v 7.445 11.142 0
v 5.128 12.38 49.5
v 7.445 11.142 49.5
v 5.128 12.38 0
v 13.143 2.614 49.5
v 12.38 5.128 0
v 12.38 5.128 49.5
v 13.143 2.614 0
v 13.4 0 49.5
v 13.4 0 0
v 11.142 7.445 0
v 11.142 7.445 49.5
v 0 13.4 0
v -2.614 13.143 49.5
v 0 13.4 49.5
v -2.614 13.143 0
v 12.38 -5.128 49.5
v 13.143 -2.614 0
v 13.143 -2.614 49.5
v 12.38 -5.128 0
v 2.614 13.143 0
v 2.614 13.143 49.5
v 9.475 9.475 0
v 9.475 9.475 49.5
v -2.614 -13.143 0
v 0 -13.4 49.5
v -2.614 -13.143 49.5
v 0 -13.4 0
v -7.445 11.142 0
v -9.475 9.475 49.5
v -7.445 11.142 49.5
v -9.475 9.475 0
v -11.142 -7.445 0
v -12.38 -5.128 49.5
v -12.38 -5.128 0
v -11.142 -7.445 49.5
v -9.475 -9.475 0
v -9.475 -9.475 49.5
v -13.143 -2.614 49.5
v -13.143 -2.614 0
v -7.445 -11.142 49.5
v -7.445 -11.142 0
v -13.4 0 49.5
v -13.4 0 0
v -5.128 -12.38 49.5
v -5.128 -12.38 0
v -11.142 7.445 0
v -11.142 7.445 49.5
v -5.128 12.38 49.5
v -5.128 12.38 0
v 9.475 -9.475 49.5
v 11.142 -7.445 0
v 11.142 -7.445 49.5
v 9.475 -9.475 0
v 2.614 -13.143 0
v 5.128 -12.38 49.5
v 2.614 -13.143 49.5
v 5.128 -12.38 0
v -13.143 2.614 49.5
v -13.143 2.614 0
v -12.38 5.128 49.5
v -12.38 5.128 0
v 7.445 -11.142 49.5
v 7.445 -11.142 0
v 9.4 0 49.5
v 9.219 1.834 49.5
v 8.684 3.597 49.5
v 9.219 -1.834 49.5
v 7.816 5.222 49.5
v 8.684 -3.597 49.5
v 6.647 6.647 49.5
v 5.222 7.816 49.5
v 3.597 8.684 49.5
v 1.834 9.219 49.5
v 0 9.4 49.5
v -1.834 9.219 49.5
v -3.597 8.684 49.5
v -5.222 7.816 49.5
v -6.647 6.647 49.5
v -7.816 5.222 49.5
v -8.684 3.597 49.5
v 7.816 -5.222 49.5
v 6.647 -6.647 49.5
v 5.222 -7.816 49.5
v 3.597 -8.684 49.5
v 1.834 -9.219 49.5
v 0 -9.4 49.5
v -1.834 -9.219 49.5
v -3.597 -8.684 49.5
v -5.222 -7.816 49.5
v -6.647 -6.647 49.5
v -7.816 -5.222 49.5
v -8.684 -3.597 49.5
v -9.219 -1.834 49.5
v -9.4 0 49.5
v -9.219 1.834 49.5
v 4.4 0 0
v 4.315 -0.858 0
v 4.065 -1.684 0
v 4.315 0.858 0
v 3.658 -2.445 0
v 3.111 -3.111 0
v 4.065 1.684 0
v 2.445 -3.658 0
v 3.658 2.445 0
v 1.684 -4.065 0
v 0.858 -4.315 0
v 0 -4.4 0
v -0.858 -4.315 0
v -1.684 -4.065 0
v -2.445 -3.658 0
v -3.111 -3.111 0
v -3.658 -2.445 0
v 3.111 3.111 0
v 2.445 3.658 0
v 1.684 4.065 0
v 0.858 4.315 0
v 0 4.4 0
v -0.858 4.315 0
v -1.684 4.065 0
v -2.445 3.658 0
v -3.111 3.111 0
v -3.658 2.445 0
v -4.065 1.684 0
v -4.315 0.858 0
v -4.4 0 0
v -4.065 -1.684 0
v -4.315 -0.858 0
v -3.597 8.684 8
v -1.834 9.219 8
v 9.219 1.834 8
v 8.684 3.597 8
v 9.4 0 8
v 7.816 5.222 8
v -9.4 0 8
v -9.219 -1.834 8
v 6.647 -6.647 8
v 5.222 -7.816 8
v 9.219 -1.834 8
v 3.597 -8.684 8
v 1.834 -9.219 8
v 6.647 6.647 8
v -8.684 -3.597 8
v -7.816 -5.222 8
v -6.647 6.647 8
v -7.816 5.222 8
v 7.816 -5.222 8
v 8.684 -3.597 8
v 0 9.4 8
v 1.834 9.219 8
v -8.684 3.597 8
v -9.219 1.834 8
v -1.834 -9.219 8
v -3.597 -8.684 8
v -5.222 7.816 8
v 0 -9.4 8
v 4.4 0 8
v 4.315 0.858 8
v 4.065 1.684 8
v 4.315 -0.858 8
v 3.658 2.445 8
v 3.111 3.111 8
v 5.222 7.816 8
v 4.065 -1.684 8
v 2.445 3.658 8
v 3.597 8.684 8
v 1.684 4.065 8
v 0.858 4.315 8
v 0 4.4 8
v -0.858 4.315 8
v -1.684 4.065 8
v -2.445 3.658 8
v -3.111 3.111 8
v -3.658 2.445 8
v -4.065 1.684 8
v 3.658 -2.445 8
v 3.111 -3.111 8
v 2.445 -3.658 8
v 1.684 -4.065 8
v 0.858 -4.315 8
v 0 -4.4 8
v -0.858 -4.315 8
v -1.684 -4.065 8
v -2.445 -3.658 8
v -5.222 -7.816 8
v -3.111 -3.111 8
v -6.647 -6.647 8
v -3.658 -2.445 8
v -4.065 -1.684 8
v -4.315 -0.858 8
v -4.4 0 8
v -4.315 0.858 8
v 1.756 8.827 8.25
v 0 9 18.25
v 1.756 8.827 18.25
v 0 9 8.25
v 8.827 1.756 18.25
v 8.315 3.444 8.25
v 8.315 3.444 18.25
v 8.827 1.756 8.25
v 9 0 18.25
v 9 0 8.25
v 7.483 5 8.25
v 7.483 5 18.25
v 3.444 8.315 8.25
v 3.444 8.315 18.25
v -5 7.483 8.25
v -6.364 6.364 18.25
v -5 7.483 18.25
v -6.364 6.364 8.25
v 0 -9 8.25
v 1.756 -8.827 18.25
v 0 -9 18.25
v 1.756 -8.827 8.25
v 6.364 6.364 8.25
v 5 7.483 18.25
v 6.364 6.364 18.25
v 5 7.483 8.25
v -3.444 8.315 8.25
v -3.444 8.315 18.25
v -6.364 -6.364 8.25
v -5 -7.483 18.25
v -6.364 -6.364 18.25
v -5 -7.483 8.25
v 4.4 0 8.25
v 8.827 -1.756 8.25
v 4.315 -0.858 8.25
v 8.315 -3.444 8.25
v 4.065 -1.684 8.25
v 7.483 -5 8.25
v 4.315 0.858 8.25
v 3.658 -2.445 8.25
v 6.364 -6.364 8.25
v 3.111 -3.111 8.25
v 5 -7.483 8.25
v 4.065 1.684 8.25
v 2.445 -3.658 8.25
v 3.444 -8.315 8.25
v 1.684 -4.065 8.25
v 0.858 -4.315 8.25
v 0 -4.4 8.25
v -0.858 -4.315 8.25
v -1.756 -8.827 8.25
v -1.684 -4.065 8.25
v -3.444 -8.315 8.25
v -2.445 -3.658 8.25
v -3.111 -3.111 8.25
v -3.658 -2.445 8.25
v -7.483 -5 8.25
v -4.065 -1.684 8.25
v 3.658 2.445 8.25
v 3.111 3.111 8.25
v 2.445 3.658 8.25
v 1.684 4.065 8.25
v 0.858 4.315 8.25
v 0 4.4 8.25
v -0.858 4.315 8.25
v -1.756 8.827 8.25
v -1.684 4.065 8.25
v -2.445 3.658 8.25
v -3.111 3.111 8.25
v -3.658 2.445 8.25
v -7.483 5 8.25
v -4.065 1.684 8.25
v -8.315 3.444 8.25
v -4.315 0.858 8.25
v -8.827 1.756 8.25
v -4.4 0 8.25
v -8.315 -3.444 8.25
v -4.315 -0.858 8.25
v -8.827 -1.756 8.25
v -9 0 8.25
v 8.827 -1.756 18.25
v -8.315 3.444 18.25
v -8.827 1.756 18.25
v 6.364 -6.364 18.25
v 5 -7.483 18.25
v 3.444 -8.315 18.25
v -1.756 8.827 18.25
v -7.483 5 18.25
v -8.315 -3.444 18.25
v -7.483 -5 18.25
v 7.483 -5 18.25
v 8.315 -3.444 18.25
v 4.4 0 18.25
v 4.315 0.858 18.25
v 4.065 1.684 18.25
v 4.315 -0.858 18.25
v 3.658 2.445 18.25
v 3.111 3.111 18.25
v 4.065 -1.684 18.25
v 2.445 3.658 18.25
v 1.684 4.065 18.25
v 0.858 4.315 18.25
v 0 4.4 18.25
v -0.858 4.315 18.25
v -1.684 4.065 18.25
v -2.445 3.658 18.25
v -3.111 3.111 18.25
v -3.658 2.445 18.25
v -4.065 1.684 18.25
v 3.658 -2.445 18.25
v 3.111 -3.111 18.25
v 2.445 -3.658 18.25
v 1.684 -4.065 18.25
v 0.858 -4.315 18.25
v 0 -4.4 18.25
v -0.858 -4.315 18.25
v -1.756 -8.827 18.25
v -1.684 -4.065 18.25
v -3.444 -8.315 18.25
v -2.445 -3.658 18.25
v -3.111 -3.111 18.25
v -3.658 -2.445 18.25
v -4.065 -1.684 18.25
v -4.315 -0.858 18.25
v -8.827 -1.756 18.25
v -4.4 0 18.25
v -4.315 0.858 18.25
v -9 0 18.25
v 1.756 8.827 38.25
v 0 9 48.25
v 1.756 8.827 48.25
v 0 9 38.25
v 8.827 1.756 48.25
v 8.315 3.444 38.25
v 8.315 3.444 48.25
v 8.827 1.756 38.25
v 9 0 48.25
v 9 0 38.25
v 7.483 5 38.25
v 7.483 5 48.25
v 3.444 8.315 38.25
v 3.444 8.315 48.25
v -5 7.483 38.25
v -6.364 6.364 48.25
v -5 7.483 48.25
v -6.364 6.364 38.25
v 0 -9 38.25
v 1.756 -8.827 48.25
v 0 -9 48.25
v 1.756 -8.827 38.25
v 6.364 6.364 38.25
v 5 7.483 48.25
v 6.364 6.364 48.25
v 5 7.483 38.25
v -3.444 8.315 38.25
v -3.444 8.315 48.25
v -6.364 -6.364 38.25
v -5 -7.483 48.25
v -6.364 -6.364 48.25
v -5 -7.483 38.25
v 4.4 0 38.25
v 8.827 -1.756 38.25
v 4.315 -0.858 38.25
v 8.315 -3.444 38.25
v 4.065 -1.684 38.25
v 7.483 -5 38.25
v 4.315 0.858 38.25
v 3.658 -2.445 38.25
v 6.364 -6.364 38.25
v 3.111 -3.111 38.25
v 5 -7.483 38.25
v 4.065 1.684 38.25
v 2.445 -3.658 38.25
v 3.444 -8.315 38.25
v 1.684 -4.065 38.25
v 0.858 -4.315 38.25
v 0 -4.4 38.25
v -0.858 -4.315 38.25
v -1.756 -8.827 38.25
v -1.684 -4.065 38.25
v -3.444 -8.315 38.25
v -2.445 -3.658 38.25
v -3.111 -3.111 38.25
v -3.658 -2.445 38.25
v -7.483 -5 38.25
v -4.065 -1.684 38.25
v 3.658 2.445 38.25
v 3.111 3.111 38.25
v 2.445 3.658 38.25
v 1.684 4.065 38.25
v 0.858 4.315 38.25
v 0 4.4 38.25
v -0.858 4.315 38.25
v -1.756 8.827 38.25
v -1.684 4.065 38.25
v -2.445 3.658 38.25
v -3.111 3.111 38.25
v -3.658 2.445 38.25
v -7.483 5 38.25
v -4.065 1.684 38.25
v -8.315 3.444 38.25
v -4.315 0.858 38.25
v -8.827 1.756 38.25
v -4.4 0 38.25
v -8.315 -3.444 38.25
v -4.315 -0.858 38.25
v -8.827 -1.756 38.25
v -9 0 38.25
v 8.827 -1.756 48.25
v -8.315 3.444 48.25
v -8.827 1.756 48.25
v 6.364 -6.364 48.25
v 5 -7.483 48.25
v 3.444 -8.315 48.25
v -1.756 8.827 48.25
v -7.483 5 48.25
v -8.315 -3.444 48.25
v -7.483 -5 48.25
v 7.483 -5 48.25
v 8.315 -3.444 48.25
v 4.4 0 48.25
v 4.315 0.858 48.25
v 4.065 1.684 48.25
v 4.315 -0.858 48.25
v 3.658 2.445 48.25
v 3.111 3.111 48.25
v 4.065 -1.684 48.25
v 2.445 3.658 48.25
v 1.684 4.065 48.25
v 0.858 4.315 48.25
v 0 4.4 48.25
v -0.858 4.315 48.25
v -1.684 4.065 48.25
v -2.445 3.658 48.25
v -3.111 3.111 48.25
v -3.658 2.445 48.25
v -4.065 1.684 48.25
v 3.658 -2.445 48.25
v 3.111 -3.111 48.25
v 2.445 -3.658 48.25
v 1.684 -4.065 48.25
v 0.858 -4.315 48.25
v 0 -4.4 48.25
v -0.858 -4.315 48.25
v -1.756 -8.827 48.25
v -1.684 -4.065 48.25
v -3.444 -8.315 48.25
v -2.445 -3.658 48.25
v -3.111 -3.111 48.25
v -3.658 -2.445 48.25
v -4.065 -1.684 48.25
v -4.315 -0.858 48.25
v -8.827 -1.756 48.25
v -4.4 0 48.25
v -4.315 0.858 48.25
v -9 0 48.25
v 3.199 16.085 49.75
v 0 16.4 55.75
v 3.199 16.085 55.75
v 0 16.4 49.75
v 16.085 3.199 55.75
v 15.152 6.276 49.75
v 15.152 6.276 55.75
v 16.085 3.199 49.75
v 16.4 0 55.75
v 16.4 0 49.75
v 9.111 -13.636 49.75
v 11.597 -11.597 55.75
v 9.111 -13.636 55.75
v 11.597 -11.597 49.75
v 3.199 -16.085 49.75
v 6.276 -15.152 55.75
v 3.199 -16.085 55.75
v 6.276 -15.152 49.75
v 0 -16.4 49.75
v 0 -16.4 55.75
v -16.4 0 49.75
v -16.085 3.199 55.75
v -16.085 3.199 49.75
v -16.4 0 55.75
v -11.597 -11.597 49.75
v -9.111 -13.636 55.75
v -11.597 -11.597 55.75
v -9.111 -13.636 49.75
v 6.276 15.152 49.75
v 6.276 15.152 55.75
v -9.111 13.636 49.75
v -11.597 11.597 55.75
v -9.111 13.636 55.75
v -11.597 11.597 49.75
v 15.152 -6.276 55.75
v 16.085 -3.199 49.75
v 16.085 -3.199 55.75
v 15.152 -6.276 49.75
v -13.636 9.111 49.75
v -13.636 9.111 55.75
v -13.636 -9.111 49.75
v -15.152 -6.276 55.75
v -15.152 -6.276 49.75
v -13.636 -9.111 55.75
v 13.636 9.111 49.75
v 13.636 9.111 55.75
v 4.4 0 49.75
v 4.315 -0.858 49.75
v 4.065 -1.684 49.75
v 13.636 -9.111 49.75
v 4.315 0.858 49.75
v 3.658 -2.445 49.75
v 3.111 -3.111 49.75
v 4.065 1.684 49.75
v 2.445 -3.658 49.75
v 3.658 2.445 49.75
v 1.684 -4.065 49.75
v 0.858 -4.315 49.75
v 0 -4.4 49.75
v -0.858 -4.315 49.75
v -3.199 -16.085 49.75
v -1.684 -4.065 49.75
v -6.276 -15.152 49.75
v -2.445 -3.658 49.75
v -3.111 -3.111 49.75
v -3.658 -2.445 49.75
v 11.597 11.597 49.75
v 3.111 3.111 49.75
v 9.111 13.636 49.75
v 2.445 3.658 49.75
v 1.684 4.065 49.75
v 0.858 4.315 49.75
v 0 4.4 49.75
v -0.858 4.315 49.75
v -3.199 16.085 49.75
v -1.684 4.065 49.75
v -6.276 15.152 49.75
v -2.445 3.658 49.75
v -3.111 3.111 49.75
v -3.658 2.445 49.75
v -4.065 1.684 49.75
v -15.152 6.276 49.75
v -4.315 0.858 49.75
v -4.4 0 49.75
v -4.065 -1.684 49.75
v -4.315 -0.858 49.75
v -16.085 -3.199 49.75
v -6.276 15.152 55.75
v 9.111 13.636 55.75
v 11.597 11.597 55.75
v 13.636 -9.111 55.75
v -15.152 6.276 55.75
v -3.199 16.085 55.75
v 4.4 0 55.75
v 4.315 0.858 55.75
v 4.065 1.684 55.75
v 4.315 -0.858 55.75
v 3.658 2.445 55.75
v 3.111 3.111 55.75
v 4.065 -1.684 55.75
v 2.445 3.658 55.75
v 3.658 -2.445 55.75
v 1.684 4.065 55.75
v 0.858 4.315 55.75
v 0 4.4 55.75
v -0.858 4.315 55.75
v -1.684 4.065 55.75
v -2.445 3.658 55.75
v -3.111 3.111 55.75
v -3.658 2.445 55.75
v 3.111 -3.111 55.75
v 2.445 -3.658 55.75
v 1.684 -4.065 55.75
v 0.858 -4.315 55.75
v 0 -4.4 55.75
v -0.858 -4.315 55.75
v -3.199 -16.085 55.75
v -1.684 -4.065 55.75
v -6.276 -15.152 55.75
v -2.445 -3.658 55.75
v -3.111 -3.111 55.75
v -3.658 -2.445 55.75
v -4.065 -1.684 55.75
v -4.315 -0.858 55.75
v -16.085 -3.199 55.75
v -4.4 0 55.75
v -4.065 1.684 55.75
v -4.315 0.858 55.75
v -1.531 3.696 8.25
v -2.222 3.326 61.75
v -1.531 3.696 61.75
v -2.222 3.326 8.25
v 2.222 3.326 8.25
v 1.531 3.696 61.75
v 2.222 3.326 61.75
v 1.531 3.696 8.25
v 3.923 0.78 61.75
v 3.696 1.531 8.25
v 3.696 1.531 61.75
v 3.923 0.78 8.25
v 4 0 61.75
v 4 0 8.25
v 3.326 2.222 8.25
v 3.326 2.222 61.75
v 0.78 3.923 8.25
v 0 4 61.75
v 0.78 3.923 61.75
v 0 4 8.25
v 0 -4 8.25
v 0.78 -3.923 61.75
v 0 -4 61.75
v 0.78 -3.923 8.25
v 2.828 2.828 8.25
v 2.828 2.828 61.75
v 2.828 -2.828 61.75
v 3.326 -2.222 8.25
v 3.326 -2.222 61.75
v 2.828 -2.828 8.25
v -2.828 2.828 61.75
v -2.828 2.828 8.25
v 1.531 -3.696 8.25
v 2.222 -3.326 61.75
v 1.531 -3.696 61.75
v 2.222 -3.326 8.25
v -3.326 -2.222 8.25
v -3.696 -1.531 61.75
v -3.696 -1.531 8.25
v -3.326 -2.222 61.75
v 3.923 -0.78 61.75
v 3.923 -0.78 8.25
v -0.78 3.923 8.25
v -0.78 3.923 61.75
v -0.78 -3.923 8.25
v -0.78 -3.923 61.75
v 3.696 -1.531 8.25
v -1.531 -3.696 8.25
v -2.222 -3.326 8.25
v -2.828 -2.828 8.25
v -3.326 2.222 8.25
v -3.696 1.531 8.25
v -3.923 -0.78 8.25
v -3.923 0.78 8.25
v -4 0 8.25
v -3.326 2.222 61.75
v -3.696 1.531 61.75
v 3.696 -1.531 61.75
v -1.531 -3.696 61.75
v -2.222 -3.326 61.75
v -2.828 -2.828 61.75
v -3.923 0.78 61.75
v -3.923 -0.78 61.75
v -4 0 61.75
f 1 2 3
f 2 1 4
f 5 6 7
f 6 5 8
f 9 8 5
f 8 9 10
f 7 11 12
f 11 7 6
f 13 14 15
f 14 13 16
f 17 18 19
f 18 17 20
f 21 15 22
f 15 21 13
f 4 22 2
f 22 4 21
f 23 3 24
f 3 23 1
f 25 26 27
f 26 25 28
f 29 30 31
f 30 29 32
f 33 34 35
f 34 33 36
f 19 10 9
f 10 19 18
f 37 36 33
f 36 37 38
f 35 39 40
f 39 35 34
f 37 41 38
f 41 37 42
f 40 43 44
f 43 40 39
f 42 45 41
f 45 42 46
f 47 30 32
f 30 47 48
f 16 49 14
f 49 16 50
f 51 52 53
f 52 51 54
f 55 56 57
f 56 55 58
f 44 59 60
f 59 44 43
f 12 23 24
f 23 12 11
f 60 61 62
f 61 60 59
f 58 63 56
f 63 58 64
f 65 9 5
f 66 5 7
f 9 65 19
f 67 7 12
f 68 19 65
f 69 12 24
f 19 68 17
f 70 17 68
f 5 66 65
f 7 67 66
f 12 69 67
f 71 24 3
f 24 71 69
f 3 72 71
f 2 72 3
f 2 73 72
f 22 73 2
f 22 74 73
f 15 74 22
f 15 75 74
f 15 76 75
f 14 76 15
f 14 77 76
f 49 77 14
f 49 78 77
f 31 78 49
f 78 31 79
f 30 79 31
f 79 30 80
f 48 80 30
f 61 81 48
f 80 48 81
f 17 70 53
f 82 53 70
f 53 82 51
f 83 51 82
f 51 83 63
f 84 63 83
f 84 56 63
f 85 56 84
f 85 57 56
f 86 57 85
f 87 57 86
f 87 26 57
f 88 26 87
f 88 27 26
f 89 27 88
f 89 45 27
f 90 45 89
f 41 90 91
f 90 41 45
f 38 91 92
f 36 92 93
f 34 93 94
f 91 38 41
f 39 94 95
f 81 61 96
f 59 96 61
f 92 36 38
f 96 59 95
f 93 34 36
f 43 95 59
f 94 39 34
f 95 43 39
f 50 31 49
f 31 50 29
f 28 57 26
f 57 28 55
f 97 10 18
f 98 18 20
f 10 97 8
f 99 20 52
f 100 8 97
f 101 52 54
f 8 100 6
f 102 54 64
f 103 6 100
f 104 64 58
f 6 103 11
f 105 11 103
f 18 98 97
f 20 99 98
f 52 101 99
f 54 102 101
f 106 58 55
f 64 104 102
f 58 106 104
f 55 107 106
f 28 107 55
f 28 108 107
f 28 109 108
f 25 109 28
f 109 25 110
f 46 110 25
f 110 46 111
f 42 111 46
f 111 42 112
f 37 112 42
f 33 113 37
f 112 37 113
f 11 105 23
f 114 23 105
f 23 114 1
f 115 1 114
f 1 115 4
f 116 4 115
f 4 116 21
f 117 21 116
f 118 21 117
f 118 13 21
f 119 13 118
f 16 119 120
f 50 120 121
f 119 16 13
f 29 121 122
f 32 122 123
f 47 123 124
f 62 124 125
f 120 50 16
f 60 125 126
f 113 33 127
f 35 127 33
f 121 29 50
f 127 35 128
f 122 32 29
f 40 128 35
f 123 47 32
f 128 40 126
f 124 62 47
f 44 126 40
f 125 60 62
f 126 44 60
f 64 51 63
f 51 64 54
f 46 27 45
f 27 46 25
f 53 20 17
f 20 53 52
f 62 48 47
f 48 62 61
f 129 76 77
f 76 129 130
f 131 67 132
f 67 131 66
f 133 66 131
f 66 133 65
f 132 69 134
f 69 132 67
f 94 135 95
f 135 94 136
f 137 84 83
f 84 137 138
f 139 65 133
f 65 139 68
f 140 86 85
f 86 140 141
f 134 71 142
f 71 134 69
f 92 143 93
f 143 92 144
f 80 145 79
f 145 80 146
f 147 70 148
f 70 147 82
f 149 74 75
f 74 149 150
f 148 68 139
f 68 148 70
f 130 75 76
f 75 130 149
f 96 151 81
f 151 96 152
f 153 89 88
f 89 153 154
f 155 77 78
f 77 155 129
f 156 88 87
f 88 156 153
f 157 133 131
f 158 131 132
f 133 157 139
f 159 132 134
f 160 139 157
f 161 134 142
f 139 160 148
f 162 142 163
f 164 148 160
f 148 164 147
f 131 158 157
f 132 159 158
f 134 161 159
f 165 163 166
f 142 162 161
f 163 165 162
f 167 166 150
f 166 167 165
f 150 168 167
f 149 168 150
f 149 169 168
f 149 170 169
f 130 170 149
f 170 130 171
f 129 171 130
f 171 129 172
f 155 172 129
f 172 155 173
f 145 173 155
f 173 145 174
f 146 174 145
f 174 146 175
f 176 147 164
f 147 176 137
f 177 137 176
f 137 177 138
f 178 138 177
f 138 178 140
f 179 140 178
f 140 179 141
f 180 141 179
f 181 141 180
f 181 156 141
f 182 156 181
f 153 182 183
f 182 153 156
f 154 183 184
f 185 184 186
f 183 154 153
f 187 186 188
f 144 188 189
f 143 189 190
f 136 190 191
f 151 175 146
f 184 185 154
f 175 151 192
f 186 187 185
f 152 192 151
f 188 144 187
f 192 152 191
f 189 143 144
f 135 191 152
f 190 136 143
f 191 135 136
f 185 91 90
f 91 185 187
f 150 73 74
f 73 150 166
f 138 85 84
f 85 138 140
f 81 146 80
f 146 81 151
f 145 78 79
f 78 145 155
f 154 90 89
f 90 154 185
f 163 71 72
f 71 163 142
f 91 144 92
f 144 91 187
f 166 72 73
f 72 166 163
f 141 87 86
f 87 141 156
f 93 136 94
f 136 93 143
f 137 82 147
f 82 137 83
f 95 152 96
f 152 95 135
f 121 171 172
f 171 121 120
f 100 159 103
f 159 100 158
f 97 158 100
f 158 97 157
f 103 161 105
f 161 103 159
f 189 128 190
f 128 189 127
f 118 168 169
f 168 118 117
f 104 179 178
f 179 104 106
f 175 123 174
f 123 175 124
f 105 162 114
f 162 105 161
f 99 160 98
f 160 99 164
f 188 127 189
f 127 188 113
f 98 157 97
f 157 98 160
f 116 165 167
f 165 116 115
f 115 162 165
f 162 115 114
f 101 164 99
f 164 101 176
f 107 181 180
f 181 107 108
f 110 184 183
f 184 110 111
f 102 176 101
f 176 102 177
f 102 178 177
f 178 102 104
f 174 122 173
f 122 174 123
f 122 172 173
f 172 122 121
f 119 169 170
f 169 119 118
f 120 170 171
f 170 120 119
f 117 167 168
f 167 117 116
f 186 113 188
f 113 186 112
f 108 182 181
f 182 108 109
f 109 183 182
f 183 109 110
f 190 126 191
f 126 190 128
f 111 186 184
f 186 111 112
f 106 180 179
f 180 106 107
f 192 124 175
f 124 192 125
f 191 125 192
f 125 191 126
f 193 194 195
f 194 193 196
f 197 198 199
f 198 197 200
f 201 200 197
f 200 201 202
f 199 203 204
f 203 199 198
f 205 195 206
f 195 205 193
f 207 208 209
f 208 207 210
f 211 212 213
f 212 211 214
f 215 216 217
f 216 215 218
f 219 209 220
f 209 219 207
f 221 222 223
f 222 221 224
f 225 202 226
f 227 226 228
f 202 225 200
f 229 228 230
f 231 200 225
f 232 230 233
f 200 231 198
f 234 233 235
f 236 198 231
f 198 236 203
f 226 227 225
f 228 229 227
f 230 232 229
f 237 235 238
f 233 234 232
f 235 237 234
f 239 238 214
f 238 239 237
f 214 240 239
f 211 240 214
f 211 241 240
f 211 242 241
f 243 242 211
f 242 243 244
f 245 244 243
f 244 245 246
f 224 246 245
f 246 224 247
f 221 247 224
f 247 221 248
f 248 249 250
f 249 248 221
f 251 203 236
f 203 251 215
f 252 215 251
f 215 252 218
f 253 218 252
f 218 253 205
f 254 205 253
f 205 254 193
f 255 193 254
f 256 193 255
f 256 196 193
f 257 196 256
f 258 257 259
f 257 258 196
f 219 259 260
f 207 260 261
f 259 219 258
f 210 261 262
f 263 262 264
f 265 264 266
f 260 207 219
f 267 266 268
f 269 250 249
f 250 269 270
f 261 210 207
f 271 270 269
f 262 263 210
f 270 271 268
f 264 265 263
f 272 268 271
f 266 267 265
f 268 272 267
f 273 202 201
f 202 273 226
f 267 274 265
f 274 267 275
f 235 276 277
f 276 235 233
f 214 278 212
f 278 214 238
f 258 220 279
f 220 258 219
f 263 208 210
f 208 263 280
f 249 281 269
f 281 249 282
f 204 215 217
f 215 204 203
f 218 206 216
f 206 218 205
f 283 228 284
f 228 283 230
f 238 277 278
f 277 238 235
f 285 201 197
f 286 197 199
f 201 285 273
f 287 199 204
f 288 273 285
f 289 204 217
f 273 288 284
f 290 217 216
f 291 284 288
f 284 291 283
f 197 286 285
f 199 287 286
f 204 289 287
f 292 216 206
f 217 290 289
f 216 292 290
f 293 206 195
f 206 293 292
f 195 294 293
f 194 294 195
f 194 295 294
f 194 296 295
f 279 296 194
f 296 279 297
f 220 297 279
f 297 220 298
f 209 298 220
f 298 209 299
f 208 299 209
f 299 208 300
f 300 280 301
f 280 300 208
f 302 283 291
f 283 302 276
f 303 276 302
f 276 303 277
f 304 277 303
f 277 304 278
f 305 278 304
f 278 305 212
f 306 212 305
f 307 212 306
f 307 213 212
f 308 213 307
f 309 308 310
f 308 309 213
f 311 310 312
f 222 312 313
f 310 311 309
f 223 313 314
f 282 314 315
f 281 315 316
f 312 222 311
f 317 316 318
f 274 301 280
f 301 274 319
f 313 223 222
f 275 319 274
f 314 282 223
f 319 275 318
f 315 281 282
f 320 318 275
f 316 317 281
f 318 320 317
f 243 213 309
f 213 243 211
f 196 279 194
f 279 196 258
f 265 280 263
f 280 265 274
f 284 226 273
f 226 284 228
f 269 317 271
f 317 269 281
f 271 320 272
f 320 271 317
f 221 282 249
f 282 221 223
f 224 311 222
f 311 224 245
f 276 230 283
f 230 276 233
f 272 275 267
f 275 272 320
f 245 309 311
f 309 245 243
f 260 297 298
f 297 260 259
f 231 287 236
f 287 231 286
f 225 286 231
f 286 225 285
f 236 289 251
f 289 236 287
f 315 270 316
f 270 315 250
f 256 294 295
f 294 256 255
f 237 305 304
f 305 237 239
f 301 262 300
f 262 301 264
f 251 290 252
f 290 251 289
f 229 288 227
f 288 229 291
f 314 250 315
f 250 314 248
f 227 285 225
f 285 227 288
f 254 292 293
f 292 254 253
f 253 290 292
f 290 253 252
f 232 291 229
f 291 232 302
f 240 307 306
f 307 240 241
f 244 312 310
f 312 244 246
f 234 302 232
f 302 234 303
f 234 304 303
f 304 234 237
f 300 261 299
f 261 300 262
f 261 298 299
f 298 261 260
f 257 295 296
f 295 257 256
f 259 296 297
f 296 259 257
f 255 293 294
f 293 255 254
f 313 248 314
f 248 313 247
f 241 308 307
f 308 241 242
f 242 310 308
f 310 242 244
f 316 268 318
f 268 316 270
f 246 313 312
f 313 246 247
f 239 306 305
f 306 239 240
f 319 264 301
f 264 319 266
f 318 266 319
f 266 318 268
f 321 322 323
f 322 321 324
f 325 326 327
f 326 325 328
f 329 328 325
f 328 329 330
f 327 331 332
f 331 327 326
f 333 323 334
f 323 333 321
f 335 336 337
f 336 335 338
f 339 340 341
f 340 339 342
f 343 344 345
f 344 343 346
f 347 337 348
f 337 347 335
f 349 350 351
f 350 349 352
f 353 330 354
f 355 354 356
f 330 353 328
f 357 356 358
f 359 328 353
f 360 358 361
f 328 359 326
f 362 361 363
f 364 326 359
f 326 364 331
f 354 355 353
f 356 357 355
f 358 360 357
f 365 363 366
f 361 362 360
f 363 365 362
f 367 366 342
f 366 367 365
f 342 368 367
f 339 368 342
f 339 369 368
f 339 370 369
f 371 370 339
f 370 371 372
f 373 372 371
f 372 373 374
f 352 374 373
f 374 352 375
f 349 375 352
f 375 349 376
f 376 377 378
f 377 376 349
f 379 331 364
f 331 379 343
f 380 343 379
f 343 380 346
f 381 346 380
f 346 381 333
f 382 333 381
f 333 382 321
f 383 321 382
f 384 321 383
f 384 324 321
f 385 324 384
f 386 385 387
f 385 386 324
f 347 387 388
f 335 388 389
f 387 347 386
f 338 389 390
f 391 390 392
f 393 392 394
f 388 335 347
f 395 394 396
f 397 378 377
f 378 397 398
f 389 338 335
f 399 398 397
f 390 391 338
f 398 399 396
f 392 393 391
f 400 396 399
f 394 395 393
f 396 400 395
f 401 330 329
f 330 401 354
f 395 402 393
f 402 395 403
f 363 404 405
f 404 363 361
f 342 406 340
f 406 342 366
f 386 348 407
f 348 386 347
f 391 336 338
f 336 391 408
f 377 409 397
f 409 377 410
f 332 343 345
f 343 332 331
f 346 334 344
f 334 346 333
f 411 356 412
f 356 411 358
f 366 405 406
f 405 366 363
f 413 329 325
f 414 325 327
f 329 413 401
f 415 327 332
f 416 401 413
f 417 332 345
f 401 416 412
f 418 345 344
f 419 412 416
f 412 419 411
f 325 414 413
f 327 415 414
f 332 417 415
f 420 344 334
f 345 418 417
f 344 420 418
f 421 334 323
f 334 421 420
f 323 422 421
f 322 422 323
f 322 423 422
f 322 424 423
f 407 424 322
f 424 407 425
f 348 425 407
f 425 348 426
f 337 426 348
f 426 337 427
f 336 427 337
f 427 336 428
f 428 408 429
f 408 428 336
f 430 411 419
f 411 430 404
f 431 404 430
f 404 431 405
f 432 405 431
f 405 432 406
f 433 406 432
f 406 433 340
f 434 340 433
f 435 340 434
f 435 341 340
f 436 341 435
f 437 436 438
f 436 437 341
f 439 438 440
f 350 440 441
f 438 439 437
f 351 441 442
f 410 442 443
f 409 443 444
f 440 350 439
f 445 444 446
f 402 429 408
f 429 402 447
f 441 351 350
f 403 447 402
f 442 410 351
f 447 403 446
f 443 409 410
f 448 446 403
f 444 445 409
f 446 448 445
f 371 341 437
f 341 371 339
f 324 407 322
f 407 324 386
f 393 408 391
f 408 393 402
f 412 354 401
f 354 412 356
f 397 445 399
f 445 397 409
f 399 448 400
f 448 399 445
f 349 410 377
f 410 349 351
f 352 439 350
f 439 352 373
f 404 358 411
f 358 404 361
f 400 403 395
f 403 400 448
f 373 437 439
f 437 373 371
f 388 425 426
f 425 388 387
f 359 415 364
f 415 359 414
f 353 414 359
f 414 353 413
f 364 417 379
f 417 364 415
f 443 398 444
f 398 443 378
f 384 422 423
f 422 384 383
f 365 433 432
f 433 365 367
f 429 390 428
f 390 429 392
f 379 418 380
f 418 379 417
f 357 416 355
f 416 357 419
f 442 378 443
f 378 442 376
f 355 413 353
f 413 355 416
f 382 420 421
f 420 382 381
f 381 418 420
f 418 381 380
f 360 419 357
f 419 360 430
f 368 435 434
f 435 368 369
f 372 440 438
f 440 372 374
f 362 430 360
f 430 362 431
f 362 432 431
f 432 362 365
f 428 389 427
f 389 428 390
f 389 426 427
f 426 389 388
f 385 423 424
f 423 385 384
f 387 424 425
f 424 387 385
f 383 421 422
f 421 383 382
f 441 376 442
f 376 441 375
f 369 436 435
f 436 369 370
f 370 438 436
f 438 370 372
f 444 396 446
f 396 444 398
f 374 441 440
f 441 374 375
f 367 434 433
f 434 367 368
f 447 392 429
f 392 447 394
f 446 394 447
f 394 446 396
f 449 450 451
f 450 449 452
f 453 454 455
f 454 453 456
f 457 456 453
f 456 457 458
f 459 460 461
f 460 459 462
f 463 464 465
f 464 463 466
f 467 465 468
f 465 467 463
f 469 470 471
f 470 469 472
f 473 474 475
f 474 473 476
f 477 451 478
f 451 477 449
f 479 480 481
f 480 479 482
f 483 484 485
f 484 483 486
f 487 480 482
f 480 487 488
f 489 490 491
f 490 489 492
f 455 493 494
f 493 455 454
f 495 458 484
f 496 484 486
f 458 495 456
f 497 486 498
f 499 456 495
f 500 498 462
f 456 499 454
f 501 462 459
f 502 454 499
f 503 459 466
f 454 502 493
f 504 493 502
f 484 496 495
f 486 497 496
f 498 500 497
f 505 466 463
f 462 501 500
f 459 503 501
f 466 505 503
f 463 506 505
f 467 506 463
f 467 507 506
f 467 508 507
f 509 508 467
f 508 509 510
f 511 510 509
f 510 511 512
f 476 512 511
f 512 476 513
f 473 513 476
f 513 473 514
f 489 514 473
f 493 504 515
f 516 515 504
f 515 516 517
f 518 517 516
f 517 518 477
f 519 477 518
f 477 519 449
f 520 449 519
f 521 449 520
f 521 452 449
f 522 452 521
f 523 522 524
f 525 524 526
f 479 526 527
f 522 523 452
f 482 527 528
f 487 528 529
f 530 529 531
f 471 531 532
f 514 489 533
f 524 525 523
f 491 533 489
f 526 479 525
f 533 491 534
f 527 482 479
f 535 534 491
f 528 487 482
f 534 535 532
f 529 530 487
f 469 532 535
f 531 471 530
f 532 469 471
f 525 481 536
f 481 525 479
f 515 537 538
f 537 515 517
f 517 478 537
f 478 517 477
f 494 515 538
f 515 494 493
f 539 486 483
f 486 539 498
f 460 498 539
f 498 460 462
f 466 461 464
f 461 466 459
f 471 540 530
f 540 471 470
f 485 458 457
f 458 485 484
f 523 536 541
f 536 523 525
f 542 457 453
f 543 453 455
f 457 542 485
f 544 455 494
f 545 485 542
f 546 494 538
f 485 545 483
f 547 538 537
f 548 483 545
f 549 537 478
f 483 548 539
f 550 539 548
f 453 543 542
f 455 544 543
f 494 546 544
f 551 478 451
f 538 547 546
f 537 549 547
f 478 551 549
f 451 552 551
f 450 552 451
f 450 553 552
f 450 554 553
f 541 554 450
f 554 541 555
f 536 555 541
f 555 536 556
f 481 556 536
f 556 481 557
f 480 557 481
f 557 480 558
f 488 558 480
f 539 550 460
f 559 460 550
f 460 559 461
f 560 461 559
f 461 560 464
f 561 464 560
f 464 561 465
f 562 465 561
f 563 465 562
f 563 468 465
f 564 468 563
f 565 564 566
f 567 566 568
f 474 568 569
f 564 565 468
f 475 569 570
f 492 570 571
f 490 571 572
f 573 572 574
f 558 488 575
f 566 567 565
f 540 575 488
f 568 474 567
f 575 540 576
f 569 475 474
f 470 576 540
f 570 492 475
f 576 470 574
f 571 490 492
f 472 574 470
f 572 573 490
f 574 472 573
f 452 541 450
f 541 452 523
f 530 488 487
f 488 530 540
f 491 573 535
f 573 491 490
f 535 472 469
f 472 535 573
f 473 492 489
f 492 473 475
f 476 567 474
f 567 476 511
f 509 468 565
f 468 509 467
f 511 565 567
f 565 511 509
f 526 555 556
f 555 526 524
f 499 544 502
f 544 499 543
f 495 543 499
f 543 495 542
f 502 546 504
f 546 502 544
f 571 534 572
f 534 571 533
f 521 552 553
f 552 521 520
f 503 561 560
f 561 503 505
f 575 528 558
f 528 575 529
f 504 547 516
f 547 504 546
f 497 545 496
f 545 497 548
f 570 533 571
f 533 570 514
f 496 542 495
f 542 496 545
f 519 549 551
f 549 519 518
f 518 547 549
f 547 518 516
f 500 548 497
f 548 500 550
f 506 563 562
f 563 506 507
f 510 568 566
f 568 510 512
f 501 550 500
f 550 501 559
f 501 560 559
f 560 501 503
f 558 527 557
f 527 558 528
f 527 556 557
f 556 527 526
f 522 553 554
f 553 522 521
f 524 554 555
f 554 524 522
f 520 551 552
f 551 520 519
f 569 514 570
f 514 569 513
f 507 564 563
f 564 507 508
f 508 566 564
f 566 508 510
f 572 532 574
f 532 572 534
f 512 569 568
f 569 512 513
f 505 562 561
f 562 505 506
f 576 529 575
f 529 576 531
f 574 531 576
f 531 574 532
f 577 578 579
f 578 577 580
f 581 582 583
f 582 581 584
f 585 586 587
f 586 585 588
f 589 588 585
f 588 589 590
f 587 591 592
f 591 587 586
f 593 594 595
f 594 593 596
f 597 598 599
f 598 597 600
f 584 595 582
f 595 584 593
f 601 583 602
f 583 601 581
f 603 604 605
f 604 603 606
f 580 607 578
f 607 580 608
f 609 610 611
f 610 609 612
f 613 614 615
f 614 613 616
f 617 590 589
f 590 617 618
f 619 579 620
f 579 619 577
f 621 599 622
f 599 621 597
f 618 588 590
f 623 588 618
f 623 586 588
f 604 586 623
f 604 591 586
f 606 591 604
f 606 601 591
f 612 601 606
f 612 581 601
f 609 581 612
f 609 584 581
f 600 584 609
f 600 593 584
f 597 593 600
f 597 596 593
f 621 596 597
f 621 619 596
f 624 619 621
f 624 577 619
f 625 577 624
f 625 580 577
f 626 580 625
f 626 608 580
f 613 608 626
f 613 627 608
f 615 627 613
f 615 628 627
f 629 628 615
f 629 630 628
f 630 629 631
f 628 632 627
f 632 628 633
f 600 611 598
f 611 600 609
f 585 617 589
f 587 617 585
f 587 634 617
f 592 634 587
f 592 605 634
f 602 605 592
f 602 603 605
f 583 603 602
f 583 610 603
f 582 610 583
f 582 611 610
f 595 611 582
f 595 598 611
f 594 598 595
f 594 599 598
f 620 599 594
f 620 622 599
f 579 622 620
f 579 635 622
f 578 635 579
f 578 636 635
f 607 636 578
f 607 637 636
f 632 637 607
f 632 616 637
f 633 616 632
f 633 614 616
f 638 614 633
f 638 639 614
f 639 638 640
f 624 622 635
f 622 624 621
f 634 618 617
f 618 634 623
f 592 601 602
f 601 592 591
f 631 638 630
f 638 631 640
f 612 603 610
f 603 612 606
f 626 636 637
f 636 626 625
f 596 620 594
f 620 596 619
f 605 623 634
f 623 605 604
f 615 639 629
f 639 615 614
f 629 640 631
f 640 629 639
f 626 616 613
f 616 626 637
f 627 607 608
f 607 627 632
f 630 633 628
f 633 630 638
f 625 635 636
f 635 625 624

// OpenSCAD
$fn = 32;

// ------------------------------------------------------------------------
// Shaft station: cup d26.8 x 49.5 mm, shaft d8
// Every part is its own module, assembly() places every instance.
// ------------------------------------------------------------------------

// --- part 1 ---
module housing_cup() {
  difference() {
    cylinder(h = 49.5, d = 26.8);
    translate([0, 0, 8]) cylinder(h = 42.5, d = 18.8);
    translate([0, 0, -1]) cylinder(h = 10, d = 8.8);
  }
}

// --- part 2 ---
module bearing_lower() {
  difference() {
      translate([0, 0, 0]) cylinder(h = 10, d = 18);
      translate([0, 0, -1]) cylinder(h = 12, d = 8.8);
    }
}

// --- part 3 ---
module bearing_upper() {
  difference() {
      translate([0, 0, 0]) cylinder(h = 10, d = 18);
      translate([0, 0, -1]) cylinder(h = 12, d = 8.8);
    }
}

// --- part 4 ---
module station_shaft() {
  translate([0, 0, -26.75]) cylinder(h = 53.5, d = 8);
}

// --- part 5 ---
module station_cover() {
  difference() {
    cylinder(h = 6, d = 32.8);
    translate([0, 0, -1]) cylinder(h = 8, d = 8.8);
  }
}

// --- assembly ---
module assembly() {
  color([0.80, 0.24, 0.20]) translate([0, 0, 0]) rotate([0, 0, 0]) housing_cup();
  color([0.20, 0.45, 0.75]) translate([0, 0, 8.25]) rotate([0, 0, 0]) bearing_lower();
  color([0.25, 0.62, 0.32]) translate([0, 0, 38.25]) rotate([0, 0, 0]) bearing_upper();
  color([0.92, 0.70, 0.18]) translate([0, 0, 35]) rotate([0, 0, 0]) station_shaft();
  color([0.58, 0.35, 0.70]) translate([0, 0, 49.75]) rotate([0, 0, 0]) station_cover();
}

assembly();
